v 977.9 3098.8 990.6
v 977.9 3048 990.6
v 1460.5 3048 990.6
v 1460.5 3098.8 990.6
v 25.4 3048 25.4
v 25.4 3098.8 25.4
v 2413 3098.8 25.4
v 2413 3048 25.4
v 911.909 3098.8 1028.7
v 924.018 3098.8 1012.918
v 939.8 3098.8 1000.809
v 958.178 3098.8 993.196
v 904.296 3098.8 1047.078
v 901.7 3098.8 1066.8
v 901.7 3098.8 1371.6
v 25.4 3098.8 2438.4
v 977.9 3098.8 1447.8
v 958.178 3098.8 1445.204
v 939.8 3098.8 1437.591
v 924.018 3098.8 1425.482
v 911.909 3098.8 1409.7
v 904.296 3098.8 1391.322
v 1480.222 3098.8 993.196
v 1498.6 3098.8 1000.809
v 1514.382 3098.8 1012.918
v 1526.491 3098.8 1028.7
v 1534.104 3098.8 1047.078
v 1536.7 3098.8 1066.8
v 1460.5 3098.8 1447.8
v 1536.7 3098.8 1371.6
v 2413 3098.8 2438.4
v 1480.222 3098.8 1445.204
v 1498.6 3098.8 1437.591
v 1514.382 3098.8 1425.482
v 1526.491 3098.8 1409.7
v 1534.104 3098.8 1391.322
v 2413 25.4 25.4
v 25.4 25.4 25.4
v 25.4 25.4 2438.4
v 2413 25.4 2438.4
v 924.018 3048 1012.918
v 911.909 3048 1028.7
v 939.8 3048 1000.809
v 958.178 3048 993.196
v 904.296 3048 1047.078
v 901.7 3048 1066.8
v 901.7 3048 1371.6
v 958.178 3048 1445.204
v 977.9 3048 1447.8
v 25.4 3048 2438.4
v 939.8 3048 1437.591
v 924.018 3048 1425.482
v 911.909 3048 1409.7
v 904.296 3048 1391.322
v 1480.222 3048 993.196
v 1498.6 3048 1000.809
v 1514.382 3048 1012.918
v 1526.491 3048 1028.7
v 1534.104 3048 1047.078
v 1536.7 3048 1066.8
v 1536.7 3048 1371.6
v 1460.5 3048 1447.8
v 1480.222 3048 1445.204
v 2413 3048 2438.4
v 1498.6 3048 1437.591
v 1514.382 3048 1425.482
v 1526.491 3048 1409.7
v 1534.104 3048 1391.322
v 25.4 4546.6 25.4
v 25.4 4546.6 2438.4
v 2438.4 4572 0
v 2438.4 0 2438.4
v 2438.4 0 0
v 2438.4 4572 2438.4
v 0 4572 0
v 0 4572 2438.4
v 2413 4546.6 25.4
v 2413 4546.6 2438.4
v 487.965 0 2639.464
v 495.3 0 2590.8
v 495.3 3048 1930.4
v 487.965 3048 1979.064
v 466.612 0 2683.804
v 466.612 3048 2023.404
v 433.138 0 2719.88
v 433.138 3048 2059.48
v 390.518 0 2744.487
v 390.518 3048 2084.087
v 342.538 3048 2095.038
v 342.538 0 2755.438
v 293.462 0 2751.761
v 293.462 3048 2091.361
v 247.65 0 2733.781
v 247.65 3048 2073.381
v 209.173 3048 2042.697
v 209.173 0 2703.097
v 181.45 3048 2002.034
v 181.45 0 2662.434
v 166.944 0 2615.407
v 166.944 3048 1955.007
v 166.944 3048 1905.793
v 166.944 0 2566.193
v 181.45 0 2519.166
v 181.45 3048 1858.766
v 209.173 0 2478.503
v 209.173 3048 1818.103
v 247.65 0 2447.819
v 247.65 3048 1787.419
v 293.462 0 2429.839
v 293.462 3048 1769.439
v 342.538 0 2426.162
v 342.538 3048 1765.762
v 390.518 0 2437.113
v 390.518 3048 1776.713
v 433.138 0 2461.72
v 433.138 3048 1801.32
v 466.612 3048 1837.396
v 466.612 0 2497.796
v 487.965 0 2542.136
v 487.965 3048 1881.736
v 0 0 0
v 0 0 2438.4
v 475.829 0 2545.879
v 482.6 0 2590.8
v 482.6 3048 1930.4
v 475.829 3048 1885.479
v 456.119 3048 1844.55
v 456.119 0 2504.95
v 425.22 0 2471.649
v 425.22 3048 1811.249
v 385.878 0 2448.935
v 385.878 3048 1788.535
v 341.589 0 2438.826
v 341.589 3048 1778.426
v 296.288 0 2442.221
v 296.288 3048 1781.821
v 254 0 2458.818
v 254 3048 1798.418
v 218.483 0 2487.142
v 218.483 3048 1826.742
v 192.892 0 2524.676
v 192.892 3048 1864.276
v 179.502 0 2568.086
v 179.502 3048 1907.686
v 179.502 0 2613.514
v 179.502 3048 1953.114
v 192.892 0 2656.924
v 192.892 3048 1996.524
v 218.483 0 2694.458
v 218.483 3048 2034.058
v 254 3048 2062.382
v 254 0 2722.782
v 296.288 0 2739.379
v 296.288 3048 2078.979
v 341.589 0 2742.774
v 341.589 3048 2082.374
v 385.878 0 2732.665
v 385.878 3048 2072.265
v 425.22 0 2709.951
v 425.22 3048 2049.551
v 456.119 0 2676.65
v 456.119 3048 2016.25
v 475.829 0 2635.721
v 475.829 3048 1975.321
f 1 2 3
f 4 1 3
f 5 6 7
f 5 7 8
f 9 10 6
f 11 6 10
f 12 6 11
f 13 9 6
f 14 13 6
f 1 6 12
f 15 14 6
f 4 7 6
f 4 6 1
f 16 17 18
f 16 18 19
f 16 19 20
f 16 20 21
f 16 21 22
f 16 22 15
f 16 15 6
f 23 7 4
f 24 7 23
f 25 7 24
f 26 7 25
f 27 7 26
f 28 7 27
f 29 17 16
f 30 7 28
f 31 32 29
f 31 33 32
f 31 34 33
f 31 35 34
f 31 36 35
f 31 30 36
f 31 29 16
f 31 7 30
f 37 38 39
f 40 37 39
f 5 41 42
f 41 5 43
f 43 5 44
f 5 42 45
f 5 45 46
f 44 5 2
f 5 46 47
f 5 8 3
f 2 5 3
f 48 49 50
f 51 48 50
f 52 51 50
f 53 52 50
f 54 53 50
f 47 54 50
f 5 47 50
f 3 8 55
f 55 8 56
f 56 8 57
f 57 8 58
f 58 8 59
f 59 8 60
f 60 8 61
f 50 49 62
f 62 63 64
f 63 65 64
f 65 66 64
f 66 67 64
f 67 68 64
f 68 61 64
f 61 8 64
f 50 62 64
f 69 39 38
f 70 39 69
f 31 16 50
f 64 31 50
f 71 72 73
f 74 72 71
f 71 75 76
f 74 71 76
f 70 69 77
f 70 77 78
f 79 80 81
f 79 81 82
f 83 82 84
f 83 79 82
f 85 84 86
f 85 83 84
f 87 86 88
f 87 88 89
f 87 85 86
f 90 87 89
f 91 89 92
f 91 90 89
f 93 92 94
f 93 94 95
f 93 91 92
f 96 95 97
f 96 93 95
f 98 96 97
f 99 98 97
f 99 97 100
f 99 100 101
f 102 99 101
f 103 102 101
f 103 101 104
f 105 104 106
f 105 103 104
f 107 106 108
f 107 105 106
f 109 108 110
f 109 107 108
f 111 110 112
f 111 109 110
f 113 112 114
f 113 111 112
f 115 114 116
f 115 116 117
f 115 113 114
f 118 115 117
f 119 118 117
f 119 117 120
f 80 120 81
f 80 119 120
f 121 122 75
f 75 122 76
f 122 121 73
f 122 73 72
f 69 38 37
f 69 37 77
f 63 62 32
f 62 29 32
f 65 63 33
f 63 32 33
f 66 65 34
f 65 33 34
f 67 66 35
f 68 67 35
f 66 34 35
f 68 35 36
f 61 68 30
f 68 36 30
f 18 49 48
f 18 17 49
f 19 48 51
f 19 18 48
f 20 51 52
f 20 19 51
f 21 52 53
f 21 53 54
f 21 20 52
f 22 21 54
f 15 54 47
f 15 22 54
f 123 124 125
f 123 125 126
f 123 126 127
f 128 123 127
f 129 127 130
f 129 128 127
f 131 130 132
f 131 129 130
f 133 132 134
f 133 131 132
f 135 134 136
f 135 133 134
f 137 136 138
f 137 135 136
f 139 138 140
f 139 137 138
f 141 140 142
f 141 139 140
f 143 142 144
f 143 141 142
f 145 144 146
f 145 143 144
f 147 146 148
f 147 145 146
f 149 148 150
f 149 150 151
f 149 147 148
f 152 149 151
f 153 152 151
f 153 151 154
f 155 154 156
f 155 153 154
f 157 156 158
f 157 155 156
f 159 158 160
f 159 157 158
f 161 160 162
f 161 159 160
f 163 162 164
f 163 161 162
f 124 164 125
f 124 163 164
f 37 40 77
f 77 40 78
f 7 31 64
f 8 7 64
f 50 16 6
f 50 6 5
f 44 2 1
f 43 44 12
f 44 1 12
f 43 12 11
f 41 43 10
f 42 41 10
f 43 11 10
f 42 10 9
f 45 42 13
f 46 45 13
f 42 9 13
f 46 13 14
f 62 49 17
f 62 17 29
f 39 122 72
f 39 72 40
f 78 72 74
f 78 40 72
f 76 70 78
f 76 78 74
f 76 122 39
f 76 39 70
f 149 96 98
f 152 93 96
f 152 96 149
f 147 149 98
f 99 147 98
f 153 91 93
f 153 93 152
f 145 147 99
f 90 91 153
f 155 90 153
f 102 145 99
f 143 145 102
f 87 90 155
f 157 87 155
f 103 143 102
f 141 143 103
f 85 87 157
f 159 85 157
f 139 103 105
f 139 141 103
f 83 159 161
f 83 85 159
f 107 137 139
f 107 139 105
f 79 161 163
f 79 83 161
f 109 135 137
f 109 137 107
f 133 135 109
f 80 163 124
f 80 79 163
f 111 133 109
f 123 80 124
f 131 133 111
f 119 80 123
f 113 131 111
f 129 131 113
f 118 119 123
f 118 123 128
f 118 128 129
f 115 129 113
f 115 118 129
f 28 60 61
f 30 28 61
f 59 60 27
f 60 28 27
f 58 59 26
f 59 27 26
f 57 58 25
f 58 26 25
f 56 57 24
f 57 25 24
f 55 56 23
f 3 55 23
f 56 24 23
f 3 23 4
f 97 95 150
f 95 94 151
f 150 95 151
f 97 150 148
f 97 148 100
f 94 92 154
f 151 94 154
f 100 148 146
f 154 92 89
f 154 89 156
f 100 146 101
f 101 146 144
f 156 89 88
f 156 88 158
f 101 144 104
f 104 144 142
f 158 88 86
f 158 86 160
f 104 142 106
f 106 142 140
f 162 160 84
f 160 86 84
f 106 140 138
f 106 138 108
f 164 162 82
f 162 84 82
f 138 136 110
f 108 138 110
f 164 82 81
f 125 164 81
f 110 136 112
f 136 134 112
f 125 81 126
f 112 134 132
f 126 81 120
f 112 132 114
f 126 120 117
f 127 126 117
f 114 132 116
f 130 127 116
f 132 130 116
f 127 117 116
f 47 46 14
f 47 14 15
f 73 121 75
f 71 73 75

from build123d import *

# Parameters (mm, degrees)
F0_W     = 4572
F0_H     = 2438.4
F1_DEPTH = 2438.4
F2_T     = -25.4
F3_W     = 50.8
F3_H     = 2413
F4_DEPTH = 2387.6
F5_W     = 635
F5_H     = 457.2
F6_DEPTH = 76.2
F7_R     = 76.2
F10_R    = 165.1
F10_R_2  = 152.4


with BuildPart() as f1:
    # F0 (on Right) → F1 (new body)
    with BuildSketch(Plane.YZ):
        with Locations((2286, 1219.2)):
            Rectangle(F0_W, F0_H)
    extrude(amount=F1_DEPTH)

    # F2
    f2_openings = [f1.faces().sort_by_distance(p)[0] for p in [
        (1219.2, 2286, 2438.4),
    ]]
    offset(amount=F2_T, openings=f2_openings)


with BuildPart() as f4:
    # F3 (on face) → F4 (new body, through all)
    with BuildSketch(Plane(origin=(2413, 0, 0), x_dir=(0, -1, 0), z_dir=(-1, 0, 0))):
        with Locations((-3073.4, 1231.9)):
            Rectangle(F3_W, F3_H)
    extrude(amount=F4_DEPTH)

    # F5 (on face) → F6 (cut)
    with BuildSketch(Plane.XZ.offset(-3048)):
        with Locations((1219.1999999997, 1219.2)):
            Rectangle(F5_W, F5_H)
    extrude(amount=-F6_DEPTH, mode=Mode.SUBTRACT)

    # F7
    f7_edges = [f4.edges().sort_by_distance(p)[0] for p in [
        (901.7, 3073.4, 990.6),
        (1536.7, 3073.4, 990.6),
        (901.7, 3073.4, 1447.8),
        (1536.7, 3073.4, 1447.8),
    ]]
    fillet(f7_edges, radius=F7_R)


with BuildPart() as f11:
    # F11: sweep along a path in F9
    with BuildLine(Plane.YZ.offset(330.2)) as f11_path:
        Line((3048, 1930.4), (0, 2590.8))
    # F10 (on face) → F11 (sweep)
    with BuildSketch(Plane.XZ.offset(-3048)):
        with Locations((330.2, 1930.4)):
            Circle(F10_R)
        with Locations((330.2, 1930.4)):
            Circle(F10_R_2, mode=Mode.SUBTRACT)
    sweep(path=f11_path.line)


solid = Compound([f1.part, f4.part, f11.part])
